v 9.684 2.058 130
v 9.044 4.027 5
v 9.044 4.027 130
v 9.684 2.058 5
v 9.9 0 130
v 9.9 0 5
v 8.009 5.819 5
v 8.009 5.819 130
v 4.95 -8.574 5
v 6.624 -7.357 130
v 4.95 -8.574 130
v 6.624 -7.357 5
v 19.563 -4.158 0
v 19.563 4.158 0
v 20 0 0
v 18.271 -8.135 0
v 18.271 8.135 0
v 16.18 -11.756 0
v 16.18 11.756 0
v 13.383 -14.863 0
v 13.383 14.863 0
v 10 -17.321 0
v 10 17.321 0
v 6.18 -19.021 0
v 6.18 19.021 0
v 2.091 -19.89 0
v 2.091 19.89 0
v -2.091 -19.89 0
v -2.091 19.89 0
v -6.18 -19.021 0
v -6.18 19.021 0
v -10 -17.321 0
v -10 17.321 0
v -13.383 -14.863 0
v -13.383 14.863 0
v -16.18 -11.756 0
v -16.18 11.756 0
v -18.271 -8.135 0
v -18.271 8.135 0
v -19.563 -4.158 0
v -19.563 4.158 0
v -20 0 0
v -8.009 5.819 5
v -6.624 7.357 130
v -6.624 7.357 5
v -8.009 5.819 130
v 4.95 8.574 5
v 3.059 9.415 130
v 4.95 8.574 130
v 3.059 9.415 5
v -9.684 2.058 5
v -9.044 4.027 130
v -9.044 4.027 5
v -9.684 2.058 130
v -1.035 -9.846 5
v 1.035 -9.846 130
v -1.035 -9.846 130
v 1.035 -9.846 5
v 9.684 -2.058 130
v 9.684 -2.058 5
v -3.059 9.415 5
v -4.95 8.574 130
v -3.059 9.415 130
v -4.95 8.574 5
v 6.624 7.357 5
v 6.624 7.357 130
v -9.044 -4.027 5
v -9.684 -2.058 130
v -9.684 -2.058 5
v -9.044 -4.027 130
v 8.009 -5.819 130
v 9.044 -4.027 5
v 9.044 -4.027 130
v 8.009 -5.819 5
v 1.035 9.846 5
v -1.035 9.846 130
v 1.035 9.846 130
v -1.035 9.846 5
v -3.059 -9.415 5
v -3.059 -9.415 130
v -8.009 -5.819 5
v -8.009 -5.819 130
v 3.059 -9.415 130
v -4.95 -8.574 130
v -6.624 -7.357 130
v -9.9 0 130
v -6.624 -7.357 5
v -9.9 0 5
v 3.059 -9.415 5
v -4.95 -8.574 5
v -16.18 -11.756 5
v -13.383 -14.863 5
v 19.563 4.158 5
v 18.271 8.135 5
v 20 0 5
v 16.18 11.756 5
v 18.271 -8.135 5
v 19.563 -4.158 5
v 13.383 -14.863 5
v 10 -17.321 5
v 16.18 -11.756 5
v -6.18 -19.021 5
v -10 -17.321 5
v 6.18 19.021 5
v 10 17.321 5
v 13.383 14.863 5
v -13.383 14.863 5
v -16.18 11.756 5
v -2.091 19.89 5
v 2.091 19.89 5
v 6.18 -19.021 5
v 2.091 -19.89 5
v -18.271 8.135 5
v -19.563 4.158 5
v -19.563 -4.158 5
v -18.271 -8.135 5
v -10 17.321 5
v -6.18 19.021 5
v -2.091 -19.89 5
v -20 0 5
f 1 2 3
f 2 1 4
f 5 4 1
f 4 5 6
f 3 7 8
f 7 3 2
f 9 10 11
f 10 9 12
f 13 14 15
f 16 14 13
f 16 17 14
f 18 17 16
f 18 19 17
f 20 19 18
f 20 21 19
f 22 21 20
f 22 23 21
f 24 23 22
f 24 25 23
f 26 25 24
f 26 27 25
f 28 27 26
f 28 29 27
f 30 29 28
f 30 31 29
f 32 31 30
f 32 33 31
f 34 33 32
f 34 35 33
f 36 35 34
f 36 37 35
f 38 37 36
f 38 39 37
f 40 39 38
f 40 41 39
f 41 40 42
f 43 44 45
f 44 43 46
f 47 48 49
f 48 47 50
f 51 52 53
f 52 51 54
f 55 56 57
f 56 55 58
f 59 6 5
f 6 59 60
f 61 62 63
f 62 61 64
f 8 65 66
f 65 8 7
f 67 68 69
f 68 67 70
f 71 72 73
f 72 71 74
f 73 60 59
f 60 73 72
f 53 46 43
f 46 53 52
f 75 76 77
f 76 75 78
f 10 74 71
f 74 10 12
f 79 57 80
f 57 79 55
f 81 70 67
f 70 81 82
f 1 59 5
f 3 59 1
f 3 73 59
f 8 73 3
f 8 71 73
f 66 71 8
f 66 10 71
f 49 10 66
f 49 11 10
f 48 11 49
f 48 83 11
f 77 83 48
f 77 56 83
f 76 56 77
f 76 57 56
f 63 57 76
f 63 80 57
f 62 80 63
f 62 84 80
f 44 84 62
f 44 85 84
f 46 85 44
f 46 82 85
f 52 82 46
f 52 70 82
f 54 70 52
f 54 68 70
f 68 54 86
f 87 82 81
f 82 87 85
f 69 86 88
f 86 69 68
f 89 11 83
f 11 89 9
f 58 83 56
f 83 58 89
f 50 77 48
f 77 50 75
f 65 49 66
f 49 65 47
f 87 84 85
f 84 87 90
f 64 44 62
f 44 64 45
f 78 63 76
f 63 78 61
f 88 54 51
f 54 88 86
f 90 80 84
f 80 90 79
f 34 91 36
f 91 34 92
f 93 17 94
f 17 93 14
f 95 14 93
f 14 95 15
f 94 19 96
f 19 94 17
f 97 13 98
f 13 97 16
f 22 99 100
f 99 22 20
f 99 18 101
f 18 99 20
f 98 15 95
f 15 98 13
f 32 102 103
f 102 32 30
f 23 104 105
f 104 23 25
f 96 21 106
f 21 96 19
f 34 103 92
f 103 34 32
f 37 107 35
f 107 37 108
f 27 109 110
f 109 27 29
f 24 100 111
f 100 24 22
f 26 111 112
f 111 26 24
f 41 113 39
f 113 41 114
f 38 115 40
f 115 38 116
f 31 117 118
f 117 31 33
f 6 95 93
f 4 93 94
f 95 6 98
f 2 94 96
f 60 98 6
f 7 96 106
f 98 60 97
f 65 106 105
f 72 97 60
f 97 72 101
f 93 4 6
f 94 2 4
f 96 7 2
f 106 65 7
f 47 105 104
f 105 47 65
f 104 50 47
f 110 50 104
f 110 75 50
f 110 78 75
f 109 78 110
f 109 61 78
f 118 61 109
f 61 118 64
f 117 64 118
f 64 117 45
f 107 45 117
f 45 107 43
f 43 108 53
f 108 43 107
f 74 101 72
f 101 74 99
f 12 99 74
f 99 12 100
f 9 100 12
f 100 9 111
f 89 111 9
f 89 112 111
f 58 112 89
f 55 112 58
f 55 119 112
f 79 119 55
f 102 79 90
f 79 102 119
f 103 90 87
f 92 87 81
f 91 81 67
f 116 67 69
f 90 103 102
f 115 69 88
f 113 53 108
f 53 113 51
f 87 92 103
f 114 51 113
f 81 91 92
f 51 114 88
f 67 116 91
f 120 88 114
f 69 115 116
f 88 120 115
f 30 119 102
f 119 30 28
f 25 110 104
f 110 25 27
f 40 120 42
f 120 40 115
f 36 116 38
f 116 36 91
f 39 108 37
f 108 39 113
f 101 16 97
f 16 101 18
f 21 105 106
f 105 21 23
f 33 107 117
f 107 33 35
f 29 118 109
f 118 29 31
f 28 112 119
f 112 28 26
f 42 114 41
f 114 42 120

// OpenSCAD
// file: bike_params.scad
/*
 * Copyright (c) 2012 Haydn Vestal
 * 
 * See the file license.txt for copying permission.
 *
 */

bicycle_axis_width = 125;
bicycle_axis_radius = 10;
bicycle_strut_radius = 6.5;
bicycle_x_front_offset = 48 * (4/7);
bicycle_x_rear_offset = 48 * (3/7);
bicycle_y_front_offset = 7.6;
bicycle_y_rear_offset = 2.4;
bike_frame_height = 200;

bicycle_gear_spacing = 12.5;
bicycle_gear_teeth = 18;
bicycle_gear_thickness = 4;
bicycle_gear_circle_radius = 32;
bicycle_axis_radius = 10;
// file: ../../params.scad
/*
 * Copyright (c) 2012 Haydn Vestal
 * 
 * See the file license.txt for copying permission.
 * 
 */

// GLOBAL
hole_radius = 5;
peg_radius = 4.5;

// MAGNET
mag_height = 6.4;
mag_ring_ir = 50;
mag_ring_or = 102;
mag_count = 16;

// BEARING
bearing_height = 25;
bearing_ir = 31;
bearing_or = 43;

// STATOR
stator_height = 16;
stator_inner_height = stator_height/2;
stator_count = 6;
stator_incidence = 360/stator_count;
stator_radius = 115;
stator_tab_width = 10;
stator_tab_offset = 50;
stator_wiring_gap = 25;
stator_wiring_gap_inset = stator_radius - (stator_wiring_gap + 10);
stator_outer_tab_extrude = 15;
stator_outer_tab_width = 30;
stator_notch = 15;
stator_notch_width = 5;
coil_edge = 80;
coil_block_length = 70;

// ROTOR & ROTOR CAP
rotor_height = mag_height + 2;
rotor_inner_height = 3;
rotor_radius = 105;
rotor_inner_radius = 20;
rotor_count = 8;
rotor_incidence = 360/rotor_count;
rotor_tie_hole_offset = 30;

rotor_cap_radius = 50;
rotor_cap_peg_radius = 35;
rotor_cap_inner_radius = 10;
rotor_cap_height = 10;
rotor_cap_insert_height = 10;
rotor_cap_bearing_inset = (bearing_height + rotor_inner_height) - rotor_cap_height;
rotor_plate_height = 5;
blade_holder_edge = 20;
rotor_peg_width = 12;
rotor_peg_height = (rotor_height * 2) + (rotor_cap_height * 2) + stator_height;

// ROTOR EDGE TIE
rotor_edge_tie_length = 40;
rotor_edge_tie_width = 20;
rotor_edge_tie_inner_height = 5;
rotor_edge_tie_height = rotor_height + rotor_plate_height;
rotor_edge_tie_peg_inset = 10;
// main file
/*
 * Copyright (c) 2012 Haydn Vestal
 * 
 * See the file license.txt for copying permission.
 *
 */

include <../../params.scad>
include <bike_params.scad>


module axis() {
  cylinder(h=bicycle_axis_width + 5, r=bicycle_axis_radius - 0.1);
  cylinder(h=5, r=bicycle_axis_radius*2);
}

axis();
